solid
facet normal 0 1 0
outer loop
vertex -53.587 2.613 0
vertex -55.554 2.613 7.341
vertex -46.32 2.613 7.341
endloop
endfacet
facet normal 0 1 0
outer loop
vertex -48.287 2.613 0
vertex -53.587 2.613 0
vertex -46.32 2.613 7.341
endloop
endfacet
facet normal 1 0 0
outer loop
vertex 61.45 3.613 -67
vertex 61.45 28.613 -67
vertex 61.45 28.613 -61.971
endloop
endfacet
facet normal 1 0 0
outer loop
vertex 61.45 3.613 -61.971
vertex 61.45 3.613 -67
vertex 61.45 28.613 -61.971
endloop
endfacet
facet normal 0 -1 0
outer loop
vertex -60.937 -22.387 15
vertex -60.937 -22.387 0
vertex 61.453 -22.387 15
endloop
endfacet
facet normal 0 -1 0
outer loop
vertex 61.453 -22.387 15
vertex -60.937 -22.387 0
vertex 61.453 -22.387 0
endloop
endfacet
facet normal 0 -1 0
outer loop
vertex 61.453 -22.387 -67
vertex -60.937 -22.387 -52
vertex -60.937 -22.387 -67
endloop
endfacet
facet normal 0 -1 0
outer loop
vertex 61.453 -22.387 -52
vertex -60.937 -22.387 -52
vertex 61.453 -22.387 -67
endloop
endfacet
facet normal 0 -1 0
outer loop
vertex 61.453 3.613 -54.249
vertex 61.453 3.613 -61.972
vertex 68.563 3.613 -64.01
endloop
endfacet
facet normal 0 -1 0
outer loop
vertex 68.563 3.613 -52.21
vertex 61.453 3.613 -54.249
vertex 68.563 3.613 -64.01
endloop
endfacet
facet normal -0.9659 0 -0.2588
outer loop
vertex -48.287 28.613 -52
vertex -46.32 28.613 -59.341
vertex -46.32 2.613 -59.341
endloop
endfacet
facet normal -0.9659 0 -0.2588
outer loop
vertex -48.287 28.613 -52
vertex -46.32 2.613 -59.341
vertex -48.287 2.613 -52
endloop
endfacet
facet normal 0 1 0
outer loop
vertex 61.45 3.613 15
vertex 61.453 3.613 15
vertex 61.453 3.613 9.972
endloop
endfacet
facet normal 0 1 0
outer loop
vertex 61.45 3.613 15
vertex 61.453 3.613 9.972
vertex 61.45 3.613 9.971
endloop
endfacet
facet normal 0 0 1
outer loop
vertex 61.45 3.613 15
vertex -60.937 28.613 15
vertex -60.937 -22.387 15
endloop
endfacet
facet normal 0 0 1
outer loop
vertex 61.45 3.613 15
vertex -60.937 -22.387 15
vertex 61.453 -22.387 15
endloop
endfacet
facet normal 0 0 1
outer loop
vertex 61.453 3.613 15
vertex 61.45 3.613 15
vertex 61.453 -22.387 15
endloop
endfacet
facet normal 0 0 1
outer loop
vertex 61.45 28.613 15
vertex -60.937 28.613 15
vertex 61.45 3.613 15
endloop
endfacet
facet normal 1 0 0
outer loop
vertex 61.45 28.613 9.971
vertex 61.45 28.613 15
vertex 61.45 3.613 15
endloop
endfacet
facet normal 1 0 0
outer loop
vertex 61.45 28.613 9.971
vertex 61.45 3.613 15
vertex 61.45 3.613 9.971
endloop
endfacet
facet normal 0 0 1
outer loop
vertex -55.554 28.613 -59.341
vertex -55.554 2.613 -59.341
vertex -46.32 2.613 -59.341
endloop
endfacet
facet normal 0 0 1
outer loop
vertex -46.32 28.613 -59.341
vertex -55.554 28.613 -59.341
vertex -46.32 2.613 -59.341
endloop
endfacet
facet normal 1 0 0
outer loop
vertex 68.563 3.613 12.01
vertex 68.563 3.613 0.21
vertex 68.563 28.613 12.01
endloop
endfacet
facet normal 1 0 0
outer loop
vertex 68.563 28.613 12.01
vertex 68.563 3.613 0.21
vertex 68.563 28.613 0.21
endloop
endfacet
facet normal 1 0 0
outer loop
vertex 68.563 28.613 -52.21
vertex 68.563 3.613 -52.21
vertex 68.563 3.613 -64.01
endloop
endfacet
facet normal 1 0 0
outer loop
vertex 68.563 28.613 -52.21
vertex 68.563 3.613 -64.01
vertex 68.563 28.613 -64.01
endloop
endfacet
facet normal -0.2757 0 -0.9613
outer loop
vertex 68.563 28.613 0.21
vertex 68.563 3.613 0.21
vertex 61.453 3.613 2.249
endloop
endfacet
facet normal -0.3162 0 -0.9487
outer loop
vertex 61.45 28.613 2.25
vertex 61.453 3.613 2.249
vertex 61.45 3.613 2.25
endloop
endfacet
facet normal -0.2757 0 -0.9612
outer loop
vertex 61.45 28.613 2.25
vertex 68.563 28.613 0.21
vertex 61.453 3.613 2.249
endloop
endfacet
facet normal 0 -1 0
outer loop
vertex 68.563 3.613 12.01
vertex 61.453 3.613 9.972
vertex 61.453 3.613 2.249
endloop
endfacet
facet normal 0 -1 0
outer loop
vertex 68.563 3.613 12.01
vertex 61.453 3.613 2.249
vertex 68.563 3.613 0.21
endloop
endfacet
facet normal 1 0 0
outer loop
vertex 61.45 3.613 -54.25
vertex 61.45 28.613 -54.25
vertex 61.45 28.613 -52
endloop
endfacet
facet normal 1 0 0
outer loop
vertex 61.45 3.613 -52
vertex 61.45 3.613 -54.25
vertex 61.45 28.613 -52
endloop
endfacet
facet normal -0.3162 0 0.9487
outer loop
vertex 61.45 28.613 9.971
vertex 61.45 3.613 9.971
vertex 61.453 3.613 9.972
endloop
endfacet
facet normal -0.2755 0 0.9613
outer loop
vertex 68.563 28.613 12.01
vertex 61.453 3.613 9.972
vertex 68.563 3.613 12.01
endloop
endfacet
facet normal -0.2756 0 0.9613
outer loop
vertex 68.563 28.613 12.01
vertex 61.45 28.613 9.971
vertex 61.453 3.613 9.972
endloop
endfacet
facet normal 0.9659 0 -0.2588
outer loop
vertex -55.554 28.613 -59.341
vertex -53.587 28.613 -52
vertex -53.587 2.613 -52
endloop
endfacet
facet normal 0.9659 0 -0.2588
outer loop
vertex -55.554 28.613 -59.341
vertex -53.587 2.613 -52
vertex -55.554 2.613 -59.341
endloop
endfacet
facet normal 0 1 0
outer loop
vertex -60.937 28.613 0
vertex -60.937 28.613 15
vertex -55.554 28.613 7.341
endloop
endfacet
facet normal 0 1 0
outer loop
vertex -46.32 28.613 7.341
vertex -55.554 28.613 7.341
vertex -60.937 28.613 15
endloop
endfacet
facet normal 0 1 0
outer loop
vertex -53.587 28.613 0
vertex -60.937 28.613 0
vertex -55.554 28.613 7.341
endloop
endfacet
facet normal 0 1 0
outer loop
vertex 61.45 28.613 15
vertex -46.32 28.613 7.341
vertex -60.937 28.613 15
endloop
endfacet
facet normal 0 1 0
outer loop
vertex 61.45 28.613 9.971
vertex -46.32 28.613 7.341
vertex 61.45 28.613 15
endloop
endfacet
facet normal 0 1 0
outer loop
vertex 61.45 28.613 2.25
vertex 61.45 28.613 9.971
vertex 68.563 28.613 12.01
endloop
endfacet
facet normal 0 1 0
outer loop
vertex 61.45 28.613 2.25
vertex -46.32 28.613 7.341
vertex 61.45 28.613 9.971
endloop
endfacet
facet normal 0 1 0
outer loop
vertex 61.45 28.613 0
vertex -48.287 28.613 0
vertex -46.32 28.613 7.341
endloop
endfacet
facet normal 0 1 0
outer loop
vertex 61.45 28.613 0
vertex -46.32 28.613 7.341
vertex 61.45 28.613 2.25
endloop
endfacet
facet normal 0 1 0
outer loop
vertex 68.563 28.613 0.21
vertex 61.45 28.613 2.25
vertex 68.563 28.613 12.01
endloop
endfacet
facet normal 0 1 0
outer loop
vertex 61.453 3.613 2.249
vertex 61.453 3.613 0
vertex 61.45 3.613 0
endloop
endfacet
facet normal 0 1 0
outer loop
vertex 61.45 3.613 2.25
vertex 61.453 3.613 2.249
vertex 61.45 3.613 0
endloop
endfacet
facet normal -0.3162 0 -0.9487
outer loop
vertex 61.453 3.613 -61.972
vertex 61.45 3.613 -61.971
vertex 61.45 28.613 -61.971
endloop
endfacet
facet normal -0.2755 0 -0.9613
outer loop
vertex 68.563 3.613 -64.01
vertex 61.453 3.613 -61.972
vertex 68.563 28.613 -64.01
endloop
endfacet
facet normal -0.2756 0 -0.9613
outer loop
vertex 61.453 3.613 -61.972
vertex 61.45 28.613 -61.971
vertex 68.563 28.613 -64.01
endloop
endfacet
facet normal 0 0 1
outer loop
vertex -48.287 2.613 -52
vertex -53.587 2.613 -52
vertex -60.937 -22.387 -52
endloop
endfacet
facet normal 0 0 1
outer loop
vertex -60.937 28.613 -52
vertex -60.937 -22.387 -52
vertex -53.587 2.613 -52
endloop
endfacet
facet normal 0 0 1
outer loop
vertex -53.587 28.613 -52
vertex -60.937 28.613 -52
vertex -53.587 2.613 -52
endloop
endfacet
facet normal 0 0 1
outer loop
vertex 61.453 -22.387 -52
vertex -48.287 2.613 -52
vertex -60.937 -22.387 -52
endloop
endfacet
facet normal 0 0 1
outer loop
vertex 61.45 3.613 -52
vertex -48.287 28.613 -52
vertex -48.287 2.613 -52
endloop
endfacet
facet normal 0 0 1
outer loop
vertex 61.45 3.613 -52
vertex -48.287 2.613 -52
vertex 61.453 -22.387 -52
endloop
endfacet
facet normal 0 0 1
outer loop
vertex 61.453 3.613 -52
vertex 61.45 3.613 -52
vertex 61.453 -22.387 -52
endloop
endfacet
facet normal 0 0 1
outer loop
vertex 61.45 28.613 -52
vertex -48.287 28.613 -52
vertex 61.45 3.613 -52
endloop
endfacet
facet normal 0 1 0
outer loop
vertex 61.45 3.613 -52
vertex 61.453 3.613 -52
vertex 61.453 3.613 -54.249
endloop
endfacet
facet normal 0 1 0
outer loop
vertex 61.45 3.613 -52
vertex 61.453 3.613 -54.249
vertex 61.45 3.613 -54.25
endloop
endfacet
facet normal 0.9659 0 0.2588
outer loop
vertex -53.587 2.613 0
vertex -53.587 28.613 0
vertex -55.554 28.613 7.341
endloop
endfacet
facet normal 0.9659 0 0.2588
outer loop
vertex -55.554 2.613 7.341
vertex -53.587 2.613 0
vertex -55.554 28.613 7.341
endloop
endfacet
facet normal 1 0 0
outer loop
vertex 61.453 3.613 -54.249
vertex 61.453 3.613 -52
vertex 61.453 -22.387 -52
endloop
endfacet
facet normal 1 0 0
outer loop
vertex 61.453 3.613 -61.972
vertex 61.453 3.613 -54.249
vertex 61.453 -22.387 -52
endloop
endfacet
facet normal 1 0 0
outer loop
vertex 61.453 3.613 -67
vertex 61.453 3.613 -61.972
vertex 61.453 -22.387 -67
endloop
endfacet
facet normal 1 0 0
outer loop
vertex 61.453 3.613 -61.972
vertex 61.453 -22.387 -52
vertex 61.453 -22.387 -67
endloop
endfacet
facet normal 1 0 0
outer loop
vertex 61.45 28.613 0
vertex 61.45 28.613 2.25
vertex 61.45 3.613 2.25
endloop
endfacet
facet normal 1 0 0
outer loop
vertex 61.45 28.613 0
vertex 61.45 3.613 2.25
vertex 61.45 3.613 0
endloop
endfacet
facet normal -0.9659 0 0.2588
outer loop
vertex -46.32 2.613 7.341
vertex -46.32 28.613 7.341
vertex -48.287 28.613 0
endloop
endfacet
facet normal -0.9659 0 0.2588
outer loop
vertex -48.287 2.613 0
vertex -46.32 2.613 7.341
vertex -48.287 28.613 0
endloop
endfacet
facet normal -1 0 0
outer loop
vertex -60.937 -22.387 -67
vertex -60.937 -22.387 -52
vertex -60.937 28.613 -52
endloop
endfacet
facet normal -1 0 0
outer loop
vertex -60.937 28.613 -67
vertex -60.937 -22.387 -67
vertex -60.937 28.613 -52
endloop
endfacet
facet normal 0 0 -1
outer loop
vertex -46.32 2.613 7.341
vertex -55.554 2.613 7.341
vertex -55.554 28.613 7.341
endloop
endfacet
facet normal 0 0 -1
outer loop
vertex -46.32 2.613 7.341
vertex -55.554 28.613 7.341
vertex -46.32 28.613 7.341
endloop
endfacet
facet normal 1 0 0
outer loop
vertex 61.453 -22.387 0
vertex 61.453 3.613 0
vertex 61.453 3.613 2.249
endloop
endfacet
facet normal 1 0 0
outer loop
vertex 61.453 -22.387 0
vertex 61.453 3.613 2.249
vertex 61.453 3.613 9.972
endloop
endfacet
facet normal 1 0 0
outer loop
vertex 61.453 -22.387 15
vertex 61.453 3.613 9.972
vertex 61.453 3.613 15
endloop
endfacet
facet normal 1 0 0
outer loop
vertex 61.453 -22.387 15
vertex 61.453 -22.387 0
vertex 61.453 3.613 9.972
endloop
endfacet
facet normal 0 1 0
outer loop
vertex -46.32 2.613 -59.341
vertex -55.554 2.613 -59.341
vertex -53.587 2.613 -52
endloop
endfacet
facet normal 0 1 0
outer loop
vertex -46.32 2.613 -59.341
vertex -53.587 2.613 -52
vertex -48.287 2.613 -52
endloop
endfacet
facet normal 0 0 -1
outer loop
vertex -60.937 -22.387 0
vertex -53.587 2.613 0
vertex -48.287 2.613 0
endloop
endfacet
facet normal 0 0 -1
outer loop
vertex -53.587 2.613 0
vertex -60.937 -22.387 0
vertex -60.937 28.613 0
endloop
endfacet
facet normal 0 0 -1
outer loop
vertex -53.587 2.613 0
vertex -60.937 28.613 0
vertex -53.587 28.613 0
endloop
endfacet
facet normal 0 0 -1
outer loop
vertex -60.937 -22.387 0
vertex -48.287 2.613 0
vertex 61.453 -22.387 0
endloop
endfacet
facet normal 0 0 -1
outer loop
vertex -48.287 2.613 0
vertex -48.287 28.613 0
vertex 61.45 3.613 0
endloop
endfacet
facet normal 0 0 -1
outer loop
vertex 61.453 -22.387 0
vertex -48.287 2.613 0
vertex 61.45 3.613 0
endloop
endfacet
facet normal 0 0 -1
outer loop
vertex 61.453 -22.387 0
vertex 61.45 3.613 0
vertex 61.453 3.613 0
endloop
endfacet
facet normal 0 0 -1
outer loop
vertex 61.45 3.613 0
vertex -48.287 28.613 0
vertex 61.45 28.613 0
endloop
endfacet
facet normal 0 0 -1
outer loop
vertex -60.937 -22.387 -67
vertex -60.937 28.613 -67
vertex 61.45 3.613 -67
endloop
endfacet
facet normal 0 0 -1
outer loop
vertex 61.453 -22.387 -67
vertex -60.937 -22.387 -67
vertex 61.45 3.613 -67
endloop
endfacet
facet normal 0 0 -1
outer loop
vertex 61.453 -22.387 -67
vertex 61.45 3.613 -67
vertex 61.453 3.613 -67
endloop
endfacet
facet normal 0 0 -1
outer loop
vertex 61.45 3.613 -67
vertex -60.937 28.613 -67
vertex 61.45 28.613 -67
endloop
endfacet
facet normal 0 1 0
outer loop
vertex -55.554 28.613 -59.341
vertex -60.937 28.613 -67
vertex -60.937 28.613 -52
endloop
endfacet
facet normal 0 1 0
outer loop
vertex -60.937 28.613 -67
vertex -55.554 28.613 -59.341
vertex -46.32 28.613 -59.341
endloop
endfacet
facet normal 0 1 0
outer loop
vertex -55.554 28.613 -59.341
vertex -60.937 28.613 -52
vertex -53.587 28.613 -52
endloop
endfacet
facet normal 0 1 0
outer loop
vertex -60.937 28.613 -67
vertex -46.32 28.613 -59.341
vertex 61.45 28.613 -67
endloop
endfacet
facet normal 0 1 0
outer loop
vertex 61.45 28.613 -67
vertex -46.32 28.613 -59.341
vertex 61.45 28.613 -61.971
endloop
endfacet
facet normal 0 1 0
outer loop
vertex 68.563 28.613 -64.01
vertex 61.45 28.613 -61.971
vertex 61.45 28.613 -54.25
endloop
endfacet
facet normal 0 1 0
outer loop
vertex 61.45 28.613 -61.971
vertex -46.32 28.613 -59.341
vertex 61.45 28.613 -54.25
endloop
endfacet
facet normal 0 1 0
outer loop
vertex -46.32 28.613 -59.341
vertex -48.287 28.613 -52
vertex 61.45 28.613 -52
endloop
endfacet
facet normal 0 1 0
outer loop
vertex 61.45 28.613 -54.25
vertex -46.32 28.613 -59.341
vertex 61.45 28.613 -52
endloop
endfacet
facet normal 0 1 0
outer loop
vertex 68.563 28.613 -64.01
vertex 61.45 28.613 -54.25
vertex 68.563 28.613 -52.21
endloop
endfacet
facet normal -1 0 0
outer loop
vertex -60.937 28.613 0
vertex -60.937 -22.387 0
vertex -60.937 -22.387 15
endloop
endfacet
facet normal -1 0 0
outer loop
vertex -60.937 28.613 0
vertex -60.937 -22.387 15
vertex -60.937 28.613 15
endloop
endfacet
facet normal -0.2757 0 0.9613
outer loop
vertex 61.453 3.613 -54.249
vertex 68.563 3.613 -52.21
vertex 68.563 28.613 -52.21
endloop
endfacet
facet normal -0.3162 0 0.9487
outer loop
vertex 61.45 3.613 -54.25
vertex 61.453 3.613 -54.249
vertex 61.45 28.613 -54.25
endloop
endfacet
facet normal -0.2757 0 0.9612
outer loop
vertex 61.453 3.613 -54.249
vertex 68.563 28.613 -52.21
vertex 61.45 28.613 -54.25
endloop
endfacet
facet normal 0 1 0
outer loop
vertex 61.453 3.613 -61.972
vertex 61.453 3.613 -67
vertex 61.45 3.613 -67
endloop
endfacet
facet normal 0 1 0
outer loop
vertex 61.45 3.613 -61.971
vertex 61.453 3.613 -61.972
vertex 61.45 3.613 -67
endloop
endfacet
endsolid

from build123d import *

# Parameters (mm, degrees)
SKETCH1_W               = 129.5
SKETCH1_H               = 51
BOSS_EXTRUDE1_DEPTH     = 15
CUT_EXTRUDE2_DEPTH      = 1
CUT_EXTRUDE2_DEPTH_BACK = 26
CUT_EXTRUDE4_DEPTH      = 25
SKETCH7_W               = 7.11
SKETCH7_H               = 15
CUT_EXTRUDE5_DEPTH      = 26


with BuildPart() as part:
    # Sketch1 → Boss-Extrude1 (new body)
    with BuildSketch(Plane.XY):
        with Locations((3.813380282, 3.112676056)):
            Rectangle(SKETCH1_W, SKETCH1_H)
    extrude(amount=BOSS_EXTRUDE1_DEPTH)

    # Sketch3 → Cut-Extrude2 (cut, two sides)
    with BuildSketch(Plane(origin=(0, 28.612676056, 0), x_dir=(1, 0, 0), z_dir=(0, 1, 0))) as cut_extrude2_sk:
        Polygon((-331.668282544, 0), (-60.936619718, 0), (-53.586619718, 0), (-55.553644461, -7.34103628), (-46.319594976, -7.34103628), (-48.286619718, 0), (-118.35713017, 261.506705118), (-537.936404333, 603.757732463), (-751.247556708, 342.251027345), align=None)
    extrude(amount=CUT_EXTRUDE2_DEPTH, mode=Mode.SUBTRACT)
    extrude(cut_extrude2_sk.sketch, amount=-CUT_EXTRUDE2_DEPTH_BACK, mode=Mode.SUBTRACT)

    # Sketch5 → Cut-Extrude4 (cut)
    with BuildSketch(Plane(origin=(0, 28.612676056, 0), x_dir=(1, 0, 0), z_dir=(0, 1, 0))):
        Polygon((61.450043732, 0), (68.563380282, 0), (68.563380282, -0.210283567), (61.450043732, -2.25), align=None)
        Polygon((61.450043732, -15), (61.450043732, -9.970567134), (68.563380282, -12.010283567), (68.563380282, -15), align=None)
    extrude(amount=-CUT_EXTRUDE4_DEPTH, mode=Mode.SUBTRACT)

    # Sketch7 → Cut-Extrude5 (cut)
    with BuildSketch(Plane.XZ.offset(22.387323944)):
        with Locations((65.008380282, 7.5)):
            Rectangle(SKETCH7_W, SKETCH7_H)
    extrude(amount=-CUT_EXTRUDE5_DEPTH, mode=Mode.SUBTRACT)


with BuildPart() as body_2:
    # Mirror2: mirrored copy
    add(part.part.mirror(Plane(origin=(0, 0, -26), x_dir=(1, 0, 0), z_dir=(0, 0, -1))))


solid = Compound([part.part, body_2.part])
